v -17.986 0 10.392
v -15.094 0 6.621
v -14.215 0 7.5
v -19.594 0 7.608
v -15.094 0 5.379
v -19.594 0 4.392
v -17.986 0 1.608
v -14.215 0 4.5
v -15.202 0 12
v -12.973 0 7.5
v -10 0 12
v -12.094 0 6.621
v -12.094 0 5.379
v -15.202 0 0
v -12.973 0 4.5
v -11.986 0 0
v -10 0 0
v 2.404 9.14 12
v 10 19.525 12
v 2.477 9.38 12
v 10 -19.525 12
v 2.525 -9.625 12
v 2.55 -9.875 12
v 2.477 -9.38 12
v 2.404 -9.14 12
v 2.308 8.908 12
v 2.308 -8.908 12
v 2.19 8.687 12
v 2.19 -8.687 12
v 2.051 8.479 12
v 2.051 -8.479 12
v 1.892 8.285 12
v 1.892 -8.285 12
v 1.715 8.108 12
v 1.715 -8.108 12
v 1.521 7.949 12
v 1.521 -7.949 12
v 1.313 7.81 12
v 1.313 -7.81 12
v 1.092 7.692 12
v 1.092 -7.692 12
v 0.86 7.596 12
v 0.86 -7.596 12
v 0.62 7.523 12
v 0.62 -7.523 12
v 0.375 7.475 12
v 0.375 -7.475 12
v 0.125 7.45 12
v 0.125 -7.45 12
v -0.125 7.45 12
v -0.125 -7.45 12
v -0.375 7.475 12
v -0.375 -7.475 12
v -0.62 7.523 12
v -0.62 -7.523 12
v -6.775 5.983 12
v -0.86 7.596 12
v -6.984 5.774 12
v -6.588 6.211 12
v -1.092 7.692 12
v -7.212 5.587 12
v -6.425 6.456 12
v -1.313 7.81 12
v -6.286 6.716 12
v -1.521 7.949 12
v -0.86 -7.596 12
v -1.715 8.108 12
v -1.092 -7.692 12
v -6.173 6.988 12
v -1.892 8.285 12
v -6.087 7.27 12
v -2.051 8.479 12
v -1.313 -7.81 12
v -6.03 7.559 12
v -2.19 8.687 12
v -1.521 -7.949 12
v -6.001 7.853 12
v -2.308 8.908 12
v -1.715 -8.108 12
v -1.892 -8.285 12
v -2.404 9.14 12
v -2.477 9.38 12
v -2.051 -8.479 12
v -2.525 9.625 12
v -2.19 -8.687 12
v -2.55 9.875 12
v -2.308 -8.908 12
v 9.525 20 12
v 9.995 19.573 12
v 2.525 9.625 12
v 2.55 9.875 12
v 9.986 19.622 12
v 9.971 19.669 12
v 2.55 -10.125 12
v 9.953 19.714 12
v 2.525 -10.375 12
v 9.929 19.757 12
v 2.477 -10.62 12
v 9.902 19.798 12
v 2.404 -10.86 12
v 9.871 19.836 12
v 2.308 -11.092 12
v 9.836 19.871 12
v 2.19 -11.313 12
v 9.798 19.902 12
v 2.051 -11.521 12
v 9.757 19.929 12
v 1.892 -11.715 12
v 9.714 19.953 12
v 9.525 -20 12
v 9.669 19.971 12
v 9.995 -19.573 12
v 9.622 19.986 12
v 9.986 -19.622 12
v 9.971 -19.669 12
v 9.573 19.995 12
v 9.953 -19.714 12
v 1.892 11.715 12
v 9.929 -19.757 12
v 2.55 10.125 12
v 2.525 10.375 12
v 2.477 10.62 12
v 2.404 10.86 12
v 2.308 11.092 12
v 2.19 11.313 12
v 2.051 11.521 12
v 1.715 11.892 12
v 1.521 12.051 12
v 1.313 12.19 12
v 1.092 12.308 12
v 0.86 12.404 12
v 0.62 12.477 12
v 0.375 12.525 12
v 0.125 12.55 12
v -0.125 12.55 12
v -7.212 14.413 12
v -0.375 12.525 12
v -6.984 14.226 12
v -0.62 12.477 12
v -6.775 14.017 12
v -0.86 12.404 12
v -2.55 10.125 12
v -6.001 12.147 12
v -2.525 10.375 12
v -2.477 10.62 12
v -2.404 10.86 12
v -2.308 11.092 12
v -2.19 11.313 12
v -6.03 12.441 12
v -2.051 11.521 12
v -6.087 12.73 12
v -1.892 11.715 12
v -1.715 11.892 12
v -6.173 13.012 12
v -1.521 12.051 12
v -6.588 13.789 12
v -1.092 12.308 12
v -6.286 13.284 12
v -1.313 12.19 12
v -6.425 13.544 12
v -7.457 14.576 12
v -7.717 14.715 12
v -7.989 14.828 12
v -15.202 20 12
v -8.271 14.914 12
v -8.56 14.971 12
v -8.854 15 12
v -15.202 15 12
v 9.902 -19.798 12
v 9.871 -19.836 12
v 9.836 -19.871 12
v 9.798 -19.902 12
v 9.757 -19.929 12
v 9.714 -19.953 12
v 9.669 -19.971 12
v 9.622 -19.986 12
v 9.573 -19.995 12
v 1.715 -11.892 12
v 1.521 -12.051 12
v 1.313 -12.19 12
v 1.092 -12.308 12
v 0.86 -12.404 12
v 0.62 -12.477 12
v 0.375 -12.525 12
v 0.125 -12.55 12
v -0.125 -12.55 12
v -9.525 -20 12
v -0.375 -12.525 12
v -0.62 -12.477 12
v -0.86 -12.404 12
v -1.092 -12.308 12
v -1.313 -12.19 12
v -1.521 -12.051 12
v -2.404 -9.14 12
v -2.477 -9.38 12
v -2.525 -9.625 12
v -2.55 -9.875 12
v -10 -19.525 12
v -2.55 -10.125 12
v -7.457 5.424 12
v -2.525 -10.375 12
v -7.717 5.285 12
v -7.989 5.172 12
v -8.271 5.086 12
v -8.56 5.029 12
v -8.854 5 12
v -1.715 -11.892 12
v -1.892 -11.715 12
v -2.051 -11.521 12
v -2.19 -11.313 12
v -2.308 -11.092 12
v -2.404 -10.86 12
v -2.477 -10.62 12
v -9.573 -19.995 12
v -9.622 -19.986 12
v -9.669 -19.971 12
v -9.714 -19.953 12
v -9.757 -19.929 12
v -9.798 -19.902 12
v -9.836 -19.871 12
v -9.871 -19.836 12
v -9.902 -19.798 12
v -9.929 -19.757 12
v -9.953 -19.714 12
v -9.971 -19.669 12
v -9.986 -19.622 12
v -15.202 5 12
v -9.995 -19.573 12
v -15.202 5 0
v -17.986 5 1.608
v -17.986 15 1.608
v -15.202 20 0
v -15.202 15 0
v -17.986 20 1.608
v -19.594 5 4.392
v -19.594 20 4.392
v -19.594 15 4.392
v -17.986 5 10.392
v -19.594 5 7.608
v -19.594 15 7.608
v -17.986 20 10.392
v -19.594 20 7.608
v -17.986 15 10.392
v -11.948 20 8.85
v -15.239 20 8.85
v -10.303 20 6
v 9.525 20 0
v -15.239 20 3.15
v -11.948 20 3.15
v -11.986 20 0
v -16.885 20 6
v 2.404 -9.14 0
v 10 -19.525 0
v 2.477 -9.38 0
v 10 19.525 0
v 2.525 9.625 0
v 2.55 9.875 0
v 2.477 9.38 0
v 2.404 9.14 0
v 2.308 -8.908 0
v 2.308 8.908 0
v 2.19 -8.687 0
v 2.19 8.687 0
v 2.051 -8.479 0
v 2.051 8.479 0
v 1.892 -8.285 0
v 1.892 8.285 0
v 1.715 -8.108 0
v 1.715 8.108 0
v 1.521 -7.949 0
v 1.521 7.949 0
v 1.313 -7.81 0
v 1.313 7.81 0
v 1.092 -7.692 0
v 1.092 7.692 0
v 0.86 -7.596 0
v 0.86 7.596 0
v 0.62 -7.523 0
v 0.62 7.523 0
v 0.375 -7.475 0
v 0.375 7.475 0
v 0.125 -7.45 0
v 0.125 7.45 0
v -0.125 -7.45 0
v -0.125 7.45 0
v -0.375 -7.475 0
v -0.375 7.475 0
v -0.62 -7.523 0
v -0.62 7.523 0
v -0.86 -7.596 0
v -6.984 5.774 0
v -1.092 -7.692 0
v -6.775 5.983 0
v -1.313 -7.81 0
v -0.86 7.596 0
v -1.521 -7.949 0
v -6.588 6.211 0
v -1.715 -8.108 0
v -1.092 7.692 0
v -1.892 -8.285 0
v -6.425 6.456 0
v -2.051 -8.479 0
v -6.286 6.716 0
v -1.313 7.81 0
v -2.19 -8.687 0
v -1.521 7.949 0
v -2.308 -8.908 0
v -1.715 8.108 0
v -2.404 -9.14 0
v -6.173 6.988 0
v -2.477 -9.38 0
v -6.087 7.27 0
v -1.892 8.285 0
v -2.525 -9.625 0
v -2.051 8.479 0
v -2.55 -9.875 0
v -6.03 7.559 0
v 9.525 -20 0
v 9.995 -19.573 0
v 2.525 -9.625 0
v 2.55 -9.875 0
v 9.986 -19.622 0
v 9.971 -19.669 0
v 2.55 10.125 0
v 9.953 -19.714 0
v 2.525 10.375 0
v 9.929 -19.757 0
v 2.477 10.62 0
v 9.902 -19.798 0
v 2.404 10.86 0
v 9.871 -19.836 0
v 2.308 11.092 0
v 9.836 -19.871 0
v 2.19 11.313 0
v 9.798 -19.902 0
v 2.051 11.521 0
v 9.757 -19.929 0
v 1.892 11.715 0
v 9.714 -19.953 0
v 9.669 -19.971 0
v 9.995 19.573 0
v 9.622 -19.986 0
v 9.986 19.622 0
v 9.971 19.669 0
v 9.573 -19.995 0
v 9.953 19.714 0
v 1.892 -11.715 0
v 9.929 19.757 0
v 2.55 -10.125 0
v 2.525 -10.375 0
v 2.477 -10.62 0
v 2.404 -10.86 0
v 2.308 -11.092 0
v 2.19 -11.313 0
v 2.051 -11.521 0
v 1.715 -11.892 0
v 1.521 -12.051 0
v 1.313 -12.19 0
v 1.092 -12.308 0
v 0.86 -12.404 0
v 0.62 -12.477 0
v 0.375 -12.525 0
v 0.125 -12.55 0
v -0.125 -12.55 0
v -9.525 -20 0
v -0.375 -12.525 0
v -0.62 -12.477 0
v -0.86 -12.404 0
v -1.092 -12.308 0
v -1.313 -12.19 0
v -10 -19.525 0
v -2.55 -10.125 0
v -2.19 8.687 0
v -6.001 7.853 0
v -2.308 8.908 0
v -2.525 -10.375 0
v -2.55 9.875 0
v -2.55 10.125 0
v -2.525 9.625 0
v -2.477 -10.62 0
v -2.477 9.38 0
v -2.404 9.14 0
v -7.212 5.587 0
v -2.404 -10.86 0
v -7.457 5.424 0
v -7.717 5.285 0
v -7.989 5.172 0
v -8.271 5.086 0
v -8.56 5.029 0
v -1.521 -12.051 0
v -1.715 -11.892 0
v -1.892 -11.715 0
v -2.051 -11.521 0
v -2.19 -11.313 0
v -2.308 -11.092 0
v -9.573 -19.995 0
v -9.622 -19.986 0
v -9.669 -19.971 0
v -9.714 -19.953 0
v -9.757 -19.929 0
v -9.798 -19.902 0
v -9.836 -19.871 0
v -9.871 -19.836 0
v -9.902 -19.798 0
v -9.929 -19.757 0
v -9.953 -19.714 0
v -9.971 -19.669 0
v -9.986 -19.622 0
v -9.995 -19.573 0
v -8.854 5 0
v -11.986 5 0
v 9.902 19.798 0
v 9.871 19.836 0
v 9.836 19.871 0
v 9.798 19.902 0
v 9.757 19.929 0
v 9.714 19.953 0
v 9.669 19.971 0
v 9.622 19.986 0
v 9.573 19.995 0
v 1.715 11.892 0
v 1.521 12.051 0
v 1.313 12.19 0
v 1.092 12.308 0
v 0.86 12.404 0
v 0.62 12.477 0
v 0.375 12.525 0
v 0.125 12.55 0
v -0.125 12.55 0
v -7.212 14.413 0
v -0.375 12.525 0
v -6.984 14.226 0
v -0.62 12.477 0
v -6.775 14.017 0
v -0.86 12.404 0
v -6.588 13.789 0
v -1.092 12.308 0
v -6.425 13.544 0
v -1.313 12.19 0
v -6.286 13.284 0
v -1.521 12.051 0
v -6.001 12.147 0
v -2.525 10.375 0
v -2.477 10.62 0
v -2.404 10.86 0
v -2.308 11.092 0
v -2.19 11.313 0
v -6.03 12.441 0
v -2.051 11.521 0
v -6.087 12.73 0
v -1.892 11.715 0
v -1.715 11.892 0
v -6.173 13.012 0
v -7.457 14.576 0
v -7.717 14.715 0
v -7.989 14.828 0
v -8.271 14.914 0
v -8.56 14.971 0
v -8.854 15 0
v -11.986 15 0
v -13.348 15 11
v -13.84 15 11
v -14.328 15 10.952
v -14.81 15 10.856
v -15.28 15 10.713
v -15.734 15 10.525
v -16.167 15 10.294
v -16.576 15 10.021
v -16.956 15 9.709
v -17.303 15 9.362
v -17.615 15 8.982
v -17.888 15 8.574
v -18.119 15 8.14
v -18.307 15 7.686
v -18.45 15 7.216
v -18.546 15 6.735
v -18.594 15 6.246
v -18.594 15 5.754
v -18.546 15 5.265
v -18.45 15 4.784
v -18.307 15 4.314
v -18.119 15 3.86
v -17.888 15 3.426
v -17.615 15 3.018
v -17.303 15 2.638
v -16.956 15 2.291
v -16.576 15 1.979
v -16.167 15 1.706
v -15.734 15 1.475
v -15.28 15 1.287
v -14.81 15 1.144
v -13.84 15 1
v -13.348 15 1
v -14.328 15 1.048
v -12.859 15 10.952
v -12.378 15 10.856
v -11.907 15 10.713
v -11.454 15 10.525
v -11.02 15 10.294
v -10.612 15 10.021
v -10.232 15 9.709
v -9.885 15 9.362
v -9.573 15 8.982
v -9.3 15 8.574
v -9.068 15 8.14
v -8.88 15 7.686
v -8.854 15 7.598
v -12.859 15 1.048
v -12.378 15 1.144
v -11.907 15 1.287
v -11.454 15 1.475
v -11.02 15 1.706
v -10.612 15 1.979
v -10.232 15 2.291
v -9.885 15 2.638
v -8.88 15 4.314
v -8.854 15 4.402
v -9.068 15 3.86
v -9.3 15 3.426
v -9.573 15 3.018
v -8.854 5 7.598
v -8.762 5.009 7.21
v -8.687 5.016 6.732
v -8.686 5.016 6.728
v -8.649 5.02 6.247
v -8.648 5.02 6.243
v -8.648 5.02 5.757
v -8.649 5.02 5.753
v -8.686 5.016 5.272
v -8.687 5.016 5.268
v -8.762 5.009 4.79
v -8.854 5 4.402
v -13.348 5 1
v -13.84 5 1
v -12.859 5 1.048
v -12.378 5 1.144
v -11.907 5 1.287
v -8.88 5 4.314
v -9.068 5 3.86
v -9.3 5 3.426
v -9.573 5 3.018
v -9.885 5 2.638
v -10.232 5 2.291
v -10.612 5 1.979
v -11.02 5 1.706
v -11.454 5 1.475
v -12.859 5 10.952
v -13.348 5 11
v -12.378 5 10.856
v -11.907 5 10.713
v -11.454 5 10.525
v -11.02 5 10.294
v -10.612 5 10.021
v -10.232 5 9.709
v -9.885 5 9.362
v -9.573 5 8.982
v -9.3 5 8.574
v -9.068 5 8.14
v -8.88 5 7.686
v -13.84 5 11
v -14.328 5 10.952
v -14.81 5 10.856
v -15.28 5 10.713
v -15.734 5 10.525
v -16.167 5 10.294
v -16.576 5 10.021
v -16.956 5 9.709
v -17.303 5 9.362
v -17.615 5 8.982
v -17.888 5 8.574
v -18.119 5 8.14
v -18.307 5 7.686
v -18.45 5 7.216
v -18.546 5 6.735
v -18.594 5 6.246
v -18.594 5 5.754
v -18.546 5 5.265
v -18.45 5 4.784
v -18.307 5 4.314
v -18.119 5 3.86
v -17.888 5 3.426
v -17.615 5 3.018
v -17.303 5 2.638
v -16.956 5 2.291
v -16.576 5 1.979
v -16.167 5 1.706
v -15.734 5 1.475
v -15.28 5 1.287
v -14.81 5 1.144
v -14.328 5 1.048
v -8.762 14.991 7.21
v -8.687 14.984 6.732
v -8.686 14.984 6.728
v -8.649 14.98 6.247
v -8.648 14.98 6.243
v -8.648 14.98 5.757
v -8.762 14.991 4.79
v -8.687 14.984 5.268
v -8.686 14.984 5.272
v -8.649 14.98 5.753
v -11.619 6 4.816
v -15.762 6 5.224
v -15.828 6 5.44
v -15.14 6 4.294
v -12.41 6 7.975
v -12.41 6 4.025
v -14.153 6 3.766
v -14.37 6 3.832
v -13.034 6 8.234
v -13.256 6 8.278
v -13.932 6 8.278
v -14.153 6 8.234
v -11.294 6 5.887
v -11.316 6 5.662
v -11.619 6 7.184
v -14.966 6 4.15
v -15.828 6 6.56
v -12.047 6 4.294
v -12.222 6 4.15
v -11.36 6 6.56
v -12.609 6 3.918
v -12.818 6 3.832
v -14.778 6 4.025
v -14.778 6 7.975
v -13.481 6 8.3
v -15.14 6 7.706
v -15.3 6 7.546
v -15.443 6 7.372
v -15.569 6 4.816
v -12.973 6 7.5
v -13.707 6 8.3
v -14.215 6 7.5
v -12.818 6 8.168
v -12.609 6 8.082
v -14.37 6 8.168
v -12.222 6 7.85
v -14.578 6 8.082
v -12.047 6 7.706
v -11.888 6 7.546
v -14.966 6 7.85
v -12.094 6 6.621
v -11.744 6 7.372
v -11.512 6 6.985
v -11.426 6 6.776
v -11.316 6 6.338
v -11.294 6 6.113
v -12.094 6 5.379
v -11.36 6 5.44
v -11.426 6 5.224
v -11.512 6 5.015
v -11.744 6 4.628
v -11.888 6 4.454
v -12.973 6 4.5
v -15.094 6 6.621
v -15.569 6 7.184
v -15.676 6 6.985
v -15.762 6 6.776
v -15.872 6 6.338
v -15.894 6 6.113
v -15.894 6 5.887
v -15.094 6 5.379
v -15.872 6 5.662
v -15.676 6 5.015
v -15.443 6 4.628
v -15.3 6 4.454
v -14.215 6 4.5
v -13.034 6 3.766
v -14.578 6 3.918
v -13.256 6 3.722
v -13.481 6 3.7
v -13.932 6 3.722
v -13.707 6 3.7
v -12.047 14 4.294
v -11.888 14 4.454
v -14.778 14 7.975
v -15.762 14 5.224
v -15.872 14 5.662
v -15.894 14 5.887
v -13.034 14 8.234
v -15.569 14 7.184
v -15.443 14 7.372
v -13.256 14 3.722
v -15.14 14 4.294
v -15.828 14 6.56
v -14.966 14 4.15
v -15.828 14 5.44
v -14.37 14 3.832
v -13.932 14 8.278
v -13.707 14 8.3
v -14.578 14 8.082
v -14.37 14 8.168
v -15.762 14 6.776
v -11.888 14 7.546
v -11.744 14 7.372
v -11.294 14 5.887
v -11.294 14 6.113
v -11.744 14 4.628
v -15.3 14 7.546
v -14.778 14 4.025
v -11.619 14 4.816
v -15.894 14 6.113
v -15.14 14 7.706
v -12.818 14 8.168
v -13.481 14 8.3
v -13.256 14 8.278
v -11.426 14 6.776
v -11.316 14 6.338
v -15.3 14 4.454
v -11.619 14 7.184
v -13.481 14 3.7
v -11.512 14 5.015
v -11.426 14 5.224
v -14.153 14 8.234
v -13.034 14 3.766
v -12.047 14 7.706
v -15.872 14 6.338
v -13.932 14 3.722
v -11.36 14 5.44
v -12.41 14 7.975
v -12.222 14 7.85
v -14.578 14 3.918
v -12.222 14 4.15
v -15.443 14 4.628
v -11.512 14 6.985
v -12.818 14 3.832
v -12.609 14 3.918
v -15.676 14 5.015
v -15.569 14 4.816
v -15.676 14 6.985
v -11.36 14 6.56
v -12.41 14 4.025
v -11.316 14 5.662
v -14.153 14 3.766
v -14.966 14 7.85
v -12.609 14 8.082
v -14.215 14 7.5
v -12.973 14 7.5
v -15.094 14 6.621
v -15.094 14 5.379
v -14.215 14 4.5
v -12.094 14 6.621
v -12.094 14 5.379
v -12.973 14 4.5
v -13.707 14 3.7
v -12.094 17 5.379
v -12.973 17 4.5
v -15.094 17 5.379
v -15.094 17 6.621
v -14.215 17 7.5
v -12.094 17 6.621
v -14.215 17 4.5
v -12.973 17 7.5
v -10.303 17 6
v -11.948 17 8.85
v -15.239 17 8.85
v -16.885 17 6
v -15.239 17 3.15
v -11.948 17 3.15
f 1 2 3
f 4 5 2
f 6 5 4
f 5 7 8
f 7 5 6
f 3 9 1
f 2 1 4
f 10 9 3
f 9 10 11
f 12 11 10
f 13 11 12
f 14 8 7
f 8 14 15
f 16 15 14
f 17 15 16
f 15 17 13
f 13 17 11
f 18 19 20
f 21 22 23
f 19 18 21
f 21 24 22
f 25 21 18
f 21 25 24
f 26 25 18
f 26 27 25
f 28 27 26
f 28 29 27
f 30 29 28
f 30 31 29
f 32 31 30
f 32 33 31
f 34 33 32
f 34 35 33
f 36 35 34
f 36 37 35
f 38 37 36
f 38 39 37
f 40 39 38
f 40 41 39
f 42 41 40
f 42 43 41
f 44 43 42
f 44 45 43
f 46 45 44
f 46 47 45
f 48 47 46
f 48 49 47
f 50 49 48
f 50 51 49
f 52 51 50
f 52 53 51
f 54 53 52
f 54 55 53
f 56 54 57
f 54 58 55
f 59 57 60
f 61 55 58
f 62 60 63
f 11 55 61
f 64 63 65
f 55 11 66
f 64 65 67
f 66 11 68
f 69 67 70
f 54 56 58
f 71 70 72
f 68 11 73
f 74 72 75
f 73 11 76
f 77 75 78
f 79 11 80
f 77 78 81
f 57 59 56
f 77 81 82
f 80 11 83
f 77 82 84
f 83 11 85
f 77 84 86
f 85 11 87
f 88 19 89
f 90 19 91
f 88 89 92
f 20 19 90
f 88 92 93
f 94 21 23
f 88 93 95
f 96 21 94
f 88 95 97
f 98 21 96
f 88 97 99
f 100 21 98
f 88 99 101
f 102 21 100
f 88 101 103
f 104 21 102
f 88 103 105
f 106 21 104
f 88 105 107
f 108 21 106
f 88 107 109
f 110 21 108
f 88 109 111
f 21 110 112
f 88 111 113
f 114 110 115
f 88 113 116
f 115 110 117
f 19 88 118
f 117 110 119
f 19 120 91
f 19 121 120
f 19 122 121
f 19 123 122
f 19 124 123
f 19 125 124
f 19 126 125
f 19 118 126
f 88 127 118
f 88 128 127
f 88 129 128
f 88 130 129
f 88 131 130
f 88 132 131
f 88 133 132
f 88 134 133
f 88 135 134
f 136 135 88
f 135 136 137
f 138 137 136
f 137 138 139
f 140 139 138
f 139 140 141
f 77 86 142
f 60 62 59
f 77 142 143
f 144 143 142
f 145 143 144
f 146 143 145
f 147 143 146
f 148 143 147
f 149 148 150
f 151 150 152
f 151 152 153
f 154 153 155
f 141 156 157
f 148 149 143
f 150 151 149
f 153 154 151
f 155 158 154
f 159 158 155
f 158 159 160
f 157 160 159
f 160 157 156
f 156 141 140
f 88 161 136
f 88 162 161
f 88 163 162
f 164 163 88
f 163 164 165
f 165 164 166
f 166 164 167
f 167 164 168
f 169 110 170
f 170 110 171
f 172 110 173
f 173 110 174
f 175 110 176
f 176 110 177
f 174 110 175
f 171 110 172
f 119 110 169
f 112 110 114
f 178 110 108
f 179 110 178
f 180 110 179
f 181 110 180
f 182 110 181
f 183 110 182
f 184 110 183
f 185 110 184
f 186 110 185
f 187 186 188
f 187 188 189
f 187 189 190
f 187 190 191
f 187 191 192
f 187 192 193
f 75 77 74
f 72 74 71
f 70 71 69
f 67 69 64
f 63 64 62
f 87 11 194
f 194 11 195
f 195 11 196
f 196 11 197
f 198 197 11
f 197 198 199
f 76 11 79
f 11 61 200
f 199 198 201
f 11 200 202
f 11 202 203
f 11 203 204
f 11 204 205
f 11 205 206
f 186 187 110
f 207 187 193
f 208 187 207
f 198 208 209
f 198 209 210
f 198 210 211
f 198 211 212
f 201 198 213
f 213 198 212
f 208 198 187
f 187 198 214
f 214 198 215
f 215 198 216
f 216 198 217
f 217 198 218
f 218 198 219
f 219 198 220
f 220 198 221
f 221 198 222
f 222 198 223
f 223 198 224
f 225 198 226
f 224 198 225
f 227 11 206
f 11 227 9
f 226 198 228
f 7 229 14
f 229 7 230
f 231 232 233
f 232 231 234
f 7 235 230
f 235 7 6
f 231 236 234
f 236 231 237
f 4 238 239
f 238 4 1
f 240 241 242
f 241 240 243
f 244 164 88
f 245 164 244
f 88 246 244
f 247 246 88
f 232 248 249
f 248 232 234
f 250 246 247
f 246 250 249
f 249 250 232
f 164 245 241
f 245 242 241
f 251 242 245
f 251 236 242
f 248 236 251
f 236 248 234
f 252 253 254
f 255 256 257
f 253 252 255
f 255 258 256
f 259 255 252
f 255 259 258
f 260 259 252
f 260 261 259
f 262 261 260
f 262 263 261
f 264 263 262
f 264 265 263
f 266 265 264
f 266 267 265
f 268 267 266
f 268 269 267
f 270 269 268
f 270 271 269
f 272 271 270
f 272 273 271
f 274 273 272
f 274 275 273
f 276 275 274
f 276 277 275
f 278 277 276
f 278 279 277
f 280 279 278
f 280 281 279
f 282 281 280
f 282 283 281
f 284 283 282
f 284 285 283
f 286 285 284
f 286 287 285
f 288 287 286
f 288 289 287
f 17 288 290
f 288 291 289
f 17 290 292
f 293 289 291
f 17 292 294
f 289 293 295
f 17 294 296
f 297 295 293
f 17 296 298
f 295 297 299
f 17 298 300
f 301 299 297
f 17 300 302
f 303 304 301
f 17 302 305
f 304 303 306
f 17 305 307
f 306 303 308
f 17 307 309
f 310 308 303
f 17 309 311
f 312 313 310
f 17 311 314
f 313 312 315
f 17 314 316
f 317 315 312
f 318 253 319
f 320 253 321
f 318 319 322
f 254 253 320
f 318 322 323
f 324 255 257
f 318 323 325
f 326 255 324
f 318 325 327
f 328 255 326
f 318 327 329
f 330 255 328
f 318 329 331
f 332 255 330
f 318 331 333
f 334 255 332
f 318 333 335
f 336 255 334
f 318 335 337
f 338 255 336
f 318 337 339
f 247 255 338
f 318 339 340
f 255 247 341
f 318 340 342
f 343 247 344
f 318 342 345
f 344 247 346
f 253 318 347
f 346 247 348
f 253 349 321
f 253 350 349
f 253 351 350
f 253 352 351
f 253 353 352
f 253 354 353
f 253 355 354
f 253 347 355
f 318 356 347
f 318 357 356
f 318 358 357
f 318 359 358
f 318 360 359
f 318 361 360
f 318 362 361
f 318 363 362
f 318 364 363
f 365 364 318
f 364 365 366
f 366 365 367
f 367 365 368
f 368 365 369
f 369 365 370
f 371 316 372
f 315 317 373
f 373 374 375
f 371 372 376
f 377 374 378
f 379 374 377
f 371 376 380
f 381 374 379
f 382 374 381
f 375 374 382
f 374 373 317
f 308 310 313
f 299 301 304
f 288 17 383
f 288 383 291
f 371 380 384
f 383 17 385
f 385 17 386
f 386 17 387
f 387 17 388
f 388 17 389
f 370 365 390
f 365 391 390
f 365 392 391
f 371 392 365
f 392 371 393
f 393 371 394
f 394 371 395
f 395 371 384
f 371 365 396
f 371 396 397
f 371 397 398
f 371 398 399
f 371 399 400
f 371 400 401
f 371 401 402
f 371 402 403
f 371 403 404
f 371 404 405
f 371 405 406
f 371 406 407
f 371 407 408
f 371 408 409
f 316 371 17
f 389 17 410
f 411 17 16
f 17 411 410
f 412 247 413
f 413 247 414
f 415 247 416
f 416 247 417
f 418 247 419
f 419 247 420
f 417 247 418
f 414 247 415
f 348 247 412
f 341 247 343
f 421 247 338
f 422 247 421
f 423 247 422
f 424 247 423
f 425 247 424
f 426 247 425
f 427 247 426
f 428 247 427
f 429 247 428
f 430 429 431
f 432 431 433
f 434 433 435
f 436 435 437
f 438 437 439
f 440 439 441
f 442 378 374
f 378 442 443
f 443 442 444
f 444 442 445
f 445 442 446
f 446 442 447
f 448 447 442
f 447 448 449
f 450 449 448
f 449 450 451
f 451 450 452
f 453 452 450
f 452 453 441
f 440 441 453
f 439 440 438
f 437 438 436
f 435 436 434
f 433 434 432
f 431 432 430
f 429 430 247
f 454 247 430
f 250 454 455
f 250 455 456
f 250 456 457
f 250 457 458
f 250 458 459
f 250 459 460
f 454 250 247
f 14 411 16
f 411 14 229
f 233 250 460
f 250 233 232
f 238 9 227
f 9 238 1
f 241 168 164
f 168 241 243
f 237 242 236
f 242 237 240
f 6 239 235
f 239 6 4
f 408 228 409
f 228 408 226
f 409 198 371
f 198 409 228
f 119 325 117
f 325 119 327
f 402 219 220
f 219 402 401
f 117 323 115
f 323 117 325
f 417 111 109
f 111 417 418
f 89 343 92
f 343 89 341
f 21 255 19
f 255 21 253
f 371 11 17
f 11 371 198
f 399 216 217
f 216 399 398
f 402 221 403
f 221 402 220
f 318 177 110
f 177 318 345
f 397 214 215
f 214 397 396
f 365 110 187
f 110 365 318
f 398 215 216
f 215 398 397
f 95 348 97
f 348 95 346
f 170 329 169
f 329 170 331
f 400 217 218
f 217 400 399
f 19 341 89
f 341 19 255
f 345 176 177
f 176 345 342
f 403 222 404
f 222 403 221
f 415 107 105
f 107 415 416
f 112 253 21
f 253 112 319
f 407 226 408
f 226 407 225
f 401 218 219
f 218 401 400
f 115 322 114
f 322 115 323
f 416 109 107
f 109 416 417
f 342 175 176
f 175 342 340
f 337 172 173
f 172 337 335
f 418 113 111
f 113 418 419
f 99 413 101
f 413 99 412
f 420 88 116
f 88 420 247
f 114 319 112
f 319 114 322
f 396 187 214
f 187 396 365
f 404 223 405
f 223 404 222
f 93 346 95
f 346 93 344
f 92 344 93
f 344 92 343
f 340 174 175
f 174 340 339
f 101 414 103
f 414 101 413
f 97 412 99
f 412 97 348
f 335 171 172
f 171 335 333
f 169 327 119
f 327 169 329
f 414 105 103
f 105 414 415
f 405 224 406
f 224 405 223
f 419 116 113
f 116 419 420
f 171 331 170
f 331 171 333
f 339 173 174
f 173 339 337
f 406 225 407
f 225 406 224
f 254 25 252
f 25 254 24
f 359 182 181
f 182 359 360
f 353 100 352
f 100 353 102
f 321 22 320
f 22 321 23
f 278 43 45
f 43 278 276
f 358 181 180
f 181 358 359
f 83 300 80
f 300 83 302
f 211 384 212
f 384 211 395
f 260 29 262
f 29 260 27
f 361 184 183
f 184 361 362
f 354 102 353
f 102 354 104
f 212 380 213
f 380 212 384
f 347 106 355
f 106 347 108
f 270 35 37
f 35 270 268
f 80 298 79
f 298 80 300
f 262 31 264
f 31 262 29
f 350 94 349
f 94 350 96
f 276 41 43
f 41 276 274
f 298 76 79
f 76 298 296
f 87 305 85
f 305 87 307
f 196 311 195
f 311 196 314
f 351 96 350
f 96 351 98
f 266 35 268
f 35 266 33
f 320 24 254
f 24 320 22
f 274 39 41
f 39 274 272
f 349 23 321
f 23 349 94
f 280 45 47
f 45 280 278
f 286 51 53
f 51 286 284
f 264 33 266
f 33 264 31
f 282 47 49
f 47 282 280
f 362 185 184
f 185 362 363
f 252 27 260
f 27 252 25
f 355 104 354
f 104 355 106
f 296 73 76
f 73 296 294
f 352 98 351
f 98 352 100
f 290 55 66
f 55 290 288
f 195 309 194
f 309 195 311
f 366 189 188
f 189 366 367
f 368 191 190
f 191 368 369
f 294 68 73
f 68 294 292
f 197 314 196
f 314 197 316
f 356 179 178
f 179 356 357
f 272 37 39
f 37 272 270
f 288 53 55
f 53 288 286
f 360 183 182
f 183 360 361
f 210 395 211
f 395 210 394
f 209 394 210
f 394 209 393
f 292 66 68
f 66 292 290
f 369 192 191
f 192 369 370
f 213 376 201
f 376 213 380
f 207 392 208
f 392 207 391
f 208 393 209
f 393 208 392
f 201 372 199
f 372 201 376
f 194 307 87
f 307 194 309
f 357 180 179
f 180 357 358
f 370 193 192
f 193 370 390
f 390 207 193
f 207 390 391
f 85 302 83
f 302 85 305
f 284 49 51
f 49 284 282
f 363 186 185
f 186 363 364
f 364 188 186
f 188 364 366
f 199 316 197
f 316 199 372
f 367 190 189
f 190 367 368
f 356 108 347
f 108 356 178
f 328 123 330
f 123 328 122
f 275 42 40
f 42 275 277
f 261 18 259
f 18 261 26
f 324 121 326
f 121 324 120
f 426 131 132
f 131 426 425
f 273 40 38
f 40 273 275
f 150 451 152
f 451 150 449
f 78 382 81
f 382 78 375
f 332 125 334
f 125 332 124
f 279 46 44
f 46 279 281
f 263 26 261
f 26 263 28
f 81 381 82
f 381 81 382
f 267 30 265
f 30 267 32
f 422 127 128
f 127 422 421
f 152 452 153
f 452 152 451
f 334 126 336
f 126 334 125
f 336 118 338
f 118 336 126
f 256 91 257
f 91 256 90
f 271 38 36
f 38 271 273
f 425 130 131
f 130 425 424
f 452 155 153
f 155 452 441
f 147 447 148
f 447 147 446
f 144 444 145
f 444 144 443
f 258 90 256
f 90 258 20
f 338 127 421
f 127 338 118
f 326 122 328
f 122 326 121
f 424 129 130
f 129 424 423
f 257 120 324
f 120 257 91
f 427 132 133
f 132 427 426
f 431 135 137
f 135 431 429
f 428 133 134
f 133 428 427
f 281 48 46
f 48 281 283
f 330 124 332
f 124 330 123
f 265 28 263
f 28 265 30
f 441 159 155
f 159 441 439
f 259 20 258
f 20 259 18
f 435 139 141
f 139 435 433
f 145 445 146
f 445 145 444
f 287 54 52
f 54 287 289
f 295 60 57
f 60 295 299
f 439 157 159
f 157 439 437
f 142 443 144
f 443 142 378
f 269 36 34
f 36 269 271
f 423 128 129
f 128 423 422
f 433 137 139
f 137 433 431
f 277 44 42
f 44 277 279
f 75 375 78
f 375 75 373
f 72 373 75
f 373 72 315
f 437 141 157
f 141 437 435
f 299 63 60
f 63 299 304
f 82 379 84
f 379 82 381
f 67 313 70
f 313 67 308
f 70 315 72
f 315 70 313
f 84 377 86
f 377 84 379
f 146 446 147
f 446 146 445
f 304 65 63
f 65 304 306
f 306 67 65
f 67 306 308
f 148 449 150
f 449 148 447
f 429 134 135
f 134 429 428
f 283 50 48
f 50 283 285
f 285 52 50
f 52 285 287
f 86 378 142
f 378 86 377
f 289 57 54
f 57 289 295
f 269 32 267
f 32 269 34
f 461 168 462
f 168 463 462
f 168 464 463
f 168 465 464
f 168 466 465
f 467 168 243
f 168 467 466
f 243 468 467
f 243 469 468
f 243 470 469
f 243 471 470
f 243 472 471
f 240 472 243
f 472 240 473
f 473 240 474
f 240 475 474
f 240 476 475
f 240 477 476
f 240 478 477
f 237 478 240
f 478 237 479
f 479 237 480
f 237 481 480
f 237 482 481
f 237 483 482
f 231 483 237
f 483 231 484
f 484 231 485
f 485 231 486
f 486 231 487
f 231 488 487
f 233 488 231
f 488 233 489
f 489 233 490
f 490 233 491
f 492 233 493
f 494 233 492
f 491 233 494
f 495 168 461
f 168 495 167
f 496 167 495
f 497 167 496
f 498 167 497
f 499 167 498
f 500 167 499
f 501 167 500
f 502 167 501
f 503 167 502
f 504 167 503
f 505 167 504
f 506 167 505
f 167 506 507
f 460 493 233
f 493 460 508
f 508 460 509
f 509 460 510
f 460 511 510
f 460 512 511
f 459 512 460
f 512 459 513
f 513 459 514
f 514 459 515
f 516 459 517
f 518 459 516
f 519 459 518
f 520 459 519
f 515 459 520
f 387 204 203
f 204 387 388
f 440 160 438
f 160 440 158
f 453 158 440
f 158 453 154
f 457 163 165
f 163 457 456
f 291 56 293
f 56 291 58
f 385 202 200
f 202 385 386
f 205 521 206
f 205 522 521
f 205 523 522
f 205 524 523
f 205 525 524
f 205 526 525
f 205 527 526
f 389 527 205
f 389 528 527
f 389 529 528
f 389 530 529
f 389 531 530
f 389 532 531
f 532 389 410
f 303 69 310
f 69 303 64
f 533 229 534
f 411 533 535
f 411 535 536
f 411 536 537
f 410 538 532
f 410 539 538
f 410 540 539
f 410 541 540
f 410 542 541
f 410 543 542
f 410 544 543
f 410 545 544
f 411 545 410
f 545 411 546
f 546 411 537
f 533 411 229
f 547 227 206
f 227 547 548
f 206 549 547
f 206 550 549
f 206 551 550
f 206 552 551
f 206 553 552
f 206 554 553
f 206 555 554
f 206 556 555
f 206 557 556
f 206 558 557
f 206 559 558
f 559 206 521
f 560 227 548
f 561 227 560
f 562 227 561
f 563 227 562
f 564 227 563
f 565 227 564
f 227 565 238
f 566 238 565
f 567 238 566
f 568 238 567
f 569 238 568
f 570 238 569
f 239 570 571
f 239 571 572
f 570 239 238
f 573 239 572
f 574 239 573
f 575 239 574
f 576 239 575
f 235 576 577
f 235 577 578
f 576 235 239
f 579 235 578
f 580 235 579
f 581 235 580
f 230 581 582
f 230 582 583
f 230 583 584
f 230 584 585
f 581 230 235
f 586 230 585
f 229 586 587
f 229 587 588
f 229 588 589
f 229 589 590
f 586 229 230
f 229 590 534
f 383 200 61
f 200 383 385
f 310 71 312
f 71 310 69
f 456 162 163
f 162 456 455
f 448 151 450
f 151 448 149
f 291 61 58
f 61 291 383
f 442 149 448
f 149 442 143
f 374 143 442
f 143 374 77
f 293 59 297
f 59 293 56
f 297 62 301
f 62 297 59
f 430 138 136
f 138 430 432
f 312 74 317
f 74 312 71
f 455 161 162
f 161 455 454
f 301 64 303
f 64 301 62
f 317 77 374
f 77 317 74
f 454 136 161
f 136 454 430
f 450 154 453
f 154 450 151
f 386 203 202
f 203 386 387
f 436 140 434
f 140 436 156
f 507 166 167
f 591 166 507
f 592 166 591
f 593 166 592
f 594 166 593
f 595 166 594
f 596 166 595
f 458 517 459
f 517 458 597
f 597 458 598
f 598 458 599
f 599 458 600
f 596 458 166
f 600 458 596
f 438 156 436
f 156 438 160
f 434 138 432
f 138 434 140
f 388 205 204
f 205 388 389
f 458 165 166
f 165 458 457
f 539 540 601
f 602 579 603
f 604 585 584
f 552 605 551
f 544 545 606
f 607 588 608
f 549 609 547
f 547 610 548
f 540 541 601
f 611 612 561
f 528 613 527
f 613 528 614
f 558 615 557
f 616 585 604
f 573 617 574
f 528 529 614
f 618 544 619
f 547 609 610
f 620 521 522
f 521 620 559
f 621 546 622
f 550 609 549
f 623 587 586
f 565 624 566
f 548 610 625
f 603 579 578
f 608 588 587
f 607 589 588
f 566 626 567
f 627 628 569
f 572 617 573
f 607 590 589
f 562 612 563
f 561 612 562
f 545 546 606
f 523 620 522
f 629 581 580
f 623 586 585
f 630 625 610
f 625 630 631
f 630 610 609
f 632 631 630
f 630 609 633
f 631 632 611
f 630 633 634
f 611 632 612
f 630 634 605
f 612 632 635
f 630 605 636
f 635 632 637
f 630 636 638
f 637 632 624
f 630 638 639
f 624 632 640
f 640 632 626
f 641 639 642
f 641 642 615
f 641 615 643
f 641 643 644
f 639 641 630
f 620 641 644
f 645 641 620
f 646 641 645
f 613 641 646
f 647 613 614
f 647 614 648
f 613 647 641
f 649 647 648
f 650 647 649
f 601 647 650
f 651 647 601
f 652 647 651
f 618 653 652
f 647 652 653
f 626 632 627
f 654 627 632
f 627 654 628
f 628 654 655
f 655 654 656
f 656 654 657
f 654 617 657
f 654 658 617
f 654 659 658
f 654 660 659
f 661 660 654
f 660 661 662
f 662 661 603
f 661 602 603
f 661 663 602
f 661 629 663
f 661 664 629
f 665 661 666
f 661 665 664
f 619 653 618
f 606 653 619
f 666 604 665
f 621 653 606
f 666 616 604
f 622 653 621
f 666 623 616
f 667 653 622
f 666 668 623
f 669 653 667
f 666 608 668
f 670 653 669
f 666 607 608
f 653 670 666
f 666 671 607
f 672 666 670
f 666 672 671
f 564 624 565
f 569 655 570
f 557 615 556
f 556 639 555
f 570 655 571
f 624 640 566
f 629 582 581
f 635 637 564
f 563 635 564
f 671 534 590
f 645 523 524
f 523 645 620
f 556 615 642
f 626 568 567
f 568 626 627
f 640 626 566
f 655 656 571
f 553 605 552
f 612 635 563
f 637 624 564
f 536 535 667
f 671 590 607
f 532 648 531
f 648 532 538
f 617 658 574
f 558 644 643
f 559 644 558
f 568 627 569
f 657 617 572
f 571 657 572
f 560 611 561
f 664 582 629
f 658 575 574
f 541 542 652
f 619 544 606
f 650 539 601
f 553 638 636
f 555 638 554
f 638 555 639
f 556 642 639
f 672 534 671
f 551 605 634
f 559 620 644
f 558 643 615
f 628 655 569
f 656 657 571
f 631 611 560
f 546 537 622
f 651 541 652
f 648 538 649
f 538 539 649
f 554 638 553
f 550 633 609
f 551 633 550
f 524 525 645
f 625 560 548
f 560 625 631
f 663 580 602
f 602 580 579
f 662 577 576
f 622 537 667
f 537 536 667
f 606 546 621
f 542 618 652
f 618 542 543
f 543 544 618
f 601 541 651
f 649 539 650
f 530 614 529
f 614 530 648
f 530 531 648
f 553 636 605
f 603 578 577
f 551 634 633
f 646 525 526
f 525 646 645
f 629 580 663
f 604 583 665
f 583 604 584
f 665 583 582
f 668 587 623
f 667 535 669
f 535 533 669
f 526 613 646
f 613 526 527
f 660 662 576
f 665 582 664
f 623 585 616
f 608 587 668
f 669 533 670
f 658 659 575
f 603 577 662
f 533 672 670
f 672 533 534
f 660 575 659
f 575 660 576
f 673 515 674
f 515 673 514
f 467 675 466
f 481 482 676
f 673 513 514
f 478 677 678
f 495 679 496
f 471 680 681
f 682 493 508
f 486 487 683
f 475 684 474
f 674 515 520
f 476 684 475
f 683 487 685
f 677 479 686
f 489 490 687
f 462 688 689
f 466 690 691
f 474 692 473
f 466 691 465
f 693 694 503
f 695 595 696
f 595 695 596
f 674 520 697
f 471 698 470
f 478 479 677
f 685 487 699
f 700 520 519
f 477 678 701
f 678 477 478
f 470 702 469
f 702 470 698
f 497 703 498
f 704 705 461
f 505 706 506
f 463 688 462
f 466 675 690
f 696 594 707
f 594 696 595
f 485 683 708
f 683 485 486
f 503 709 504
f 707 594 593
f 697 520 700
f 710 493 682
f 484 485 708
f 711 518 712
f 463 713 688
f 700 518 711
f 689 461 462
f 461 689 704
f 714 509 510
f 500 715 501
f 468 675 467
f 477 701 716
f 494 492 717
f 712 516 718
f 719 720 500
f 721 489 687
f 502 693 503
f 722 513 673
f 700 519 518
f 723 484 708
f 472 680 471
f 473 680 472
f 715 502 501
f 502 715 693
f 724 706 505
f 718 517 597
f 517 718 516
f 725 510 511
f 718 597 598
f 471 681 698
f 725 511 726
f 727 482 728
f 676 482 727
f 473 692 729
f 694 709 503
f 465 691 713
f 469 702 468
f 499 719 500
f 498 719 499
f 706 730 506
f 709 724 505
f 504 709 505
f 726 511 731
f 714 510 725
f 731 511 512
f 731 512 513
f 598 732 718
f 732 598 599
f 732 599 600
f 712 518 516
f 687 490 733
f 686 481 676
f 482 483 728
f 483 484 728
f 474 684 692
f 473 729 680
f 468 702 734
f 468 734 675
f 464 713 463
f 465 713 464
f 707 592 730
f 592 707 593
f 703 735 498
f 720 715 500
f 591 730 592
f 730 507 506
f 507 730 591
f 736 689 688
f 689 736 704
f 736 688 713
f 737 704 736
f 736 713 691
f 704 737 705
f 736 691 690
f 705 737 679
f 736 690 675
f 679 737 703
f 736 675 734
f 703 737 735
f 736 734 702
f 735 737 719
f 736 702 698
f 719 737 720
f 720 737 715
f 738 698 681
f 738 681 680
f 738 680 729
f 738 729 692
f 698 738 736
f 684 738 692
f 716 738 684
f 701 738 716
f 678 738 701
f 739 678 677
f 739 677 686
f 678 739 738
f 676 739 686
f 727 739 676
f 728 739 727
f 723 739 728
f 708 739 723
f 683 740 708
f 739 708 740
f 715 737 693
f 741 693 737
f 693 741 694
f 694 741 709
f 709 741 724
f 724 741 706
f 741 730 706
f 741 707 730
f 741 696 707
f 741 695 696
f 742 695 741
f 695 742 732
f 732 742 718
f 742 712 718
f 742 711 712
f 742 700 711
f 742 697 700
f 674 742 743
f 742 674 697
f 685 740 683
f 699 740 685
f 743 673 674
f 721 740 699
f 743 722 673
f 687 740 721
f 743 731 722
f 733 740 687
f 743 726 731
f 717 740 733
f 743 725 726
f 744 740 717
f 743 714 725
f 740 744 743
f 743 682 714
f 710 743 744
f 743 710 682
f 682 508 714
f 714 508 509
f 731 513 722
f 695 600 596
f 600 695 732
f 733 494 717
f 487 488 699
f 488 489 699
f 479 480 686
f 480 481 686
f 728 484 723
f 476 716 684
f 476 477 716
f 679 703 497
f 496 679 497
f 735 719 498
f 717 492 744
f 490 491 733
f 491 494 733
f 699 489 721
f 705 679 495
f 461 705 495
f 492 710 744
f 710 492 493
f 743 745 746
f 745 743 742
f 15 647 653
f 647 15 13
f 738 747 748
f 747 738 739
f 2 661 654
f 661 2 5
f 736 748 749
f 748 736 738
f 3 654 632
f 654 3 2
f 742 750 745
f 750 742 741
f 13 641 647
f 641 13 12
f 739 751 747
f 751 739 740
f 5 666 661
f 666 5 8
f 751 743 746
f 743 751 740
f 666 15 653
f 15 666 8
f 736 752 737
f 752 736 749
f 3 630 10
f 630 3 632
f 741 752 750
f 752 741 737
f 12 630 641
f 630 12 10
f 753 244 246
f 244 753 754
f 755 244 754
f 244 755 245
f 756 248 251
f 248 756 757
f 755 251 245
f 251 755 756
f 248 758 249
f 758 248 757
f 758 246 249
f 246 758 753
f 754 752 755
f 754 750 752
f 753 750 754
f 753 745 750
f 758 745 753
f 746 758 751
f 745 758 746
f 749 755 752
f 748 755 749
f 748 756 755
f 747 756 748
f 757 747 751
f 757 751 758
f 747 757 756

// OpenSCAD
include <../lib/util.scad>;
include <../config.scad>;
use <../sketch-for-simpler.scad>;

rotate([0,-90,0]) {
  x_max_endcap();
}
